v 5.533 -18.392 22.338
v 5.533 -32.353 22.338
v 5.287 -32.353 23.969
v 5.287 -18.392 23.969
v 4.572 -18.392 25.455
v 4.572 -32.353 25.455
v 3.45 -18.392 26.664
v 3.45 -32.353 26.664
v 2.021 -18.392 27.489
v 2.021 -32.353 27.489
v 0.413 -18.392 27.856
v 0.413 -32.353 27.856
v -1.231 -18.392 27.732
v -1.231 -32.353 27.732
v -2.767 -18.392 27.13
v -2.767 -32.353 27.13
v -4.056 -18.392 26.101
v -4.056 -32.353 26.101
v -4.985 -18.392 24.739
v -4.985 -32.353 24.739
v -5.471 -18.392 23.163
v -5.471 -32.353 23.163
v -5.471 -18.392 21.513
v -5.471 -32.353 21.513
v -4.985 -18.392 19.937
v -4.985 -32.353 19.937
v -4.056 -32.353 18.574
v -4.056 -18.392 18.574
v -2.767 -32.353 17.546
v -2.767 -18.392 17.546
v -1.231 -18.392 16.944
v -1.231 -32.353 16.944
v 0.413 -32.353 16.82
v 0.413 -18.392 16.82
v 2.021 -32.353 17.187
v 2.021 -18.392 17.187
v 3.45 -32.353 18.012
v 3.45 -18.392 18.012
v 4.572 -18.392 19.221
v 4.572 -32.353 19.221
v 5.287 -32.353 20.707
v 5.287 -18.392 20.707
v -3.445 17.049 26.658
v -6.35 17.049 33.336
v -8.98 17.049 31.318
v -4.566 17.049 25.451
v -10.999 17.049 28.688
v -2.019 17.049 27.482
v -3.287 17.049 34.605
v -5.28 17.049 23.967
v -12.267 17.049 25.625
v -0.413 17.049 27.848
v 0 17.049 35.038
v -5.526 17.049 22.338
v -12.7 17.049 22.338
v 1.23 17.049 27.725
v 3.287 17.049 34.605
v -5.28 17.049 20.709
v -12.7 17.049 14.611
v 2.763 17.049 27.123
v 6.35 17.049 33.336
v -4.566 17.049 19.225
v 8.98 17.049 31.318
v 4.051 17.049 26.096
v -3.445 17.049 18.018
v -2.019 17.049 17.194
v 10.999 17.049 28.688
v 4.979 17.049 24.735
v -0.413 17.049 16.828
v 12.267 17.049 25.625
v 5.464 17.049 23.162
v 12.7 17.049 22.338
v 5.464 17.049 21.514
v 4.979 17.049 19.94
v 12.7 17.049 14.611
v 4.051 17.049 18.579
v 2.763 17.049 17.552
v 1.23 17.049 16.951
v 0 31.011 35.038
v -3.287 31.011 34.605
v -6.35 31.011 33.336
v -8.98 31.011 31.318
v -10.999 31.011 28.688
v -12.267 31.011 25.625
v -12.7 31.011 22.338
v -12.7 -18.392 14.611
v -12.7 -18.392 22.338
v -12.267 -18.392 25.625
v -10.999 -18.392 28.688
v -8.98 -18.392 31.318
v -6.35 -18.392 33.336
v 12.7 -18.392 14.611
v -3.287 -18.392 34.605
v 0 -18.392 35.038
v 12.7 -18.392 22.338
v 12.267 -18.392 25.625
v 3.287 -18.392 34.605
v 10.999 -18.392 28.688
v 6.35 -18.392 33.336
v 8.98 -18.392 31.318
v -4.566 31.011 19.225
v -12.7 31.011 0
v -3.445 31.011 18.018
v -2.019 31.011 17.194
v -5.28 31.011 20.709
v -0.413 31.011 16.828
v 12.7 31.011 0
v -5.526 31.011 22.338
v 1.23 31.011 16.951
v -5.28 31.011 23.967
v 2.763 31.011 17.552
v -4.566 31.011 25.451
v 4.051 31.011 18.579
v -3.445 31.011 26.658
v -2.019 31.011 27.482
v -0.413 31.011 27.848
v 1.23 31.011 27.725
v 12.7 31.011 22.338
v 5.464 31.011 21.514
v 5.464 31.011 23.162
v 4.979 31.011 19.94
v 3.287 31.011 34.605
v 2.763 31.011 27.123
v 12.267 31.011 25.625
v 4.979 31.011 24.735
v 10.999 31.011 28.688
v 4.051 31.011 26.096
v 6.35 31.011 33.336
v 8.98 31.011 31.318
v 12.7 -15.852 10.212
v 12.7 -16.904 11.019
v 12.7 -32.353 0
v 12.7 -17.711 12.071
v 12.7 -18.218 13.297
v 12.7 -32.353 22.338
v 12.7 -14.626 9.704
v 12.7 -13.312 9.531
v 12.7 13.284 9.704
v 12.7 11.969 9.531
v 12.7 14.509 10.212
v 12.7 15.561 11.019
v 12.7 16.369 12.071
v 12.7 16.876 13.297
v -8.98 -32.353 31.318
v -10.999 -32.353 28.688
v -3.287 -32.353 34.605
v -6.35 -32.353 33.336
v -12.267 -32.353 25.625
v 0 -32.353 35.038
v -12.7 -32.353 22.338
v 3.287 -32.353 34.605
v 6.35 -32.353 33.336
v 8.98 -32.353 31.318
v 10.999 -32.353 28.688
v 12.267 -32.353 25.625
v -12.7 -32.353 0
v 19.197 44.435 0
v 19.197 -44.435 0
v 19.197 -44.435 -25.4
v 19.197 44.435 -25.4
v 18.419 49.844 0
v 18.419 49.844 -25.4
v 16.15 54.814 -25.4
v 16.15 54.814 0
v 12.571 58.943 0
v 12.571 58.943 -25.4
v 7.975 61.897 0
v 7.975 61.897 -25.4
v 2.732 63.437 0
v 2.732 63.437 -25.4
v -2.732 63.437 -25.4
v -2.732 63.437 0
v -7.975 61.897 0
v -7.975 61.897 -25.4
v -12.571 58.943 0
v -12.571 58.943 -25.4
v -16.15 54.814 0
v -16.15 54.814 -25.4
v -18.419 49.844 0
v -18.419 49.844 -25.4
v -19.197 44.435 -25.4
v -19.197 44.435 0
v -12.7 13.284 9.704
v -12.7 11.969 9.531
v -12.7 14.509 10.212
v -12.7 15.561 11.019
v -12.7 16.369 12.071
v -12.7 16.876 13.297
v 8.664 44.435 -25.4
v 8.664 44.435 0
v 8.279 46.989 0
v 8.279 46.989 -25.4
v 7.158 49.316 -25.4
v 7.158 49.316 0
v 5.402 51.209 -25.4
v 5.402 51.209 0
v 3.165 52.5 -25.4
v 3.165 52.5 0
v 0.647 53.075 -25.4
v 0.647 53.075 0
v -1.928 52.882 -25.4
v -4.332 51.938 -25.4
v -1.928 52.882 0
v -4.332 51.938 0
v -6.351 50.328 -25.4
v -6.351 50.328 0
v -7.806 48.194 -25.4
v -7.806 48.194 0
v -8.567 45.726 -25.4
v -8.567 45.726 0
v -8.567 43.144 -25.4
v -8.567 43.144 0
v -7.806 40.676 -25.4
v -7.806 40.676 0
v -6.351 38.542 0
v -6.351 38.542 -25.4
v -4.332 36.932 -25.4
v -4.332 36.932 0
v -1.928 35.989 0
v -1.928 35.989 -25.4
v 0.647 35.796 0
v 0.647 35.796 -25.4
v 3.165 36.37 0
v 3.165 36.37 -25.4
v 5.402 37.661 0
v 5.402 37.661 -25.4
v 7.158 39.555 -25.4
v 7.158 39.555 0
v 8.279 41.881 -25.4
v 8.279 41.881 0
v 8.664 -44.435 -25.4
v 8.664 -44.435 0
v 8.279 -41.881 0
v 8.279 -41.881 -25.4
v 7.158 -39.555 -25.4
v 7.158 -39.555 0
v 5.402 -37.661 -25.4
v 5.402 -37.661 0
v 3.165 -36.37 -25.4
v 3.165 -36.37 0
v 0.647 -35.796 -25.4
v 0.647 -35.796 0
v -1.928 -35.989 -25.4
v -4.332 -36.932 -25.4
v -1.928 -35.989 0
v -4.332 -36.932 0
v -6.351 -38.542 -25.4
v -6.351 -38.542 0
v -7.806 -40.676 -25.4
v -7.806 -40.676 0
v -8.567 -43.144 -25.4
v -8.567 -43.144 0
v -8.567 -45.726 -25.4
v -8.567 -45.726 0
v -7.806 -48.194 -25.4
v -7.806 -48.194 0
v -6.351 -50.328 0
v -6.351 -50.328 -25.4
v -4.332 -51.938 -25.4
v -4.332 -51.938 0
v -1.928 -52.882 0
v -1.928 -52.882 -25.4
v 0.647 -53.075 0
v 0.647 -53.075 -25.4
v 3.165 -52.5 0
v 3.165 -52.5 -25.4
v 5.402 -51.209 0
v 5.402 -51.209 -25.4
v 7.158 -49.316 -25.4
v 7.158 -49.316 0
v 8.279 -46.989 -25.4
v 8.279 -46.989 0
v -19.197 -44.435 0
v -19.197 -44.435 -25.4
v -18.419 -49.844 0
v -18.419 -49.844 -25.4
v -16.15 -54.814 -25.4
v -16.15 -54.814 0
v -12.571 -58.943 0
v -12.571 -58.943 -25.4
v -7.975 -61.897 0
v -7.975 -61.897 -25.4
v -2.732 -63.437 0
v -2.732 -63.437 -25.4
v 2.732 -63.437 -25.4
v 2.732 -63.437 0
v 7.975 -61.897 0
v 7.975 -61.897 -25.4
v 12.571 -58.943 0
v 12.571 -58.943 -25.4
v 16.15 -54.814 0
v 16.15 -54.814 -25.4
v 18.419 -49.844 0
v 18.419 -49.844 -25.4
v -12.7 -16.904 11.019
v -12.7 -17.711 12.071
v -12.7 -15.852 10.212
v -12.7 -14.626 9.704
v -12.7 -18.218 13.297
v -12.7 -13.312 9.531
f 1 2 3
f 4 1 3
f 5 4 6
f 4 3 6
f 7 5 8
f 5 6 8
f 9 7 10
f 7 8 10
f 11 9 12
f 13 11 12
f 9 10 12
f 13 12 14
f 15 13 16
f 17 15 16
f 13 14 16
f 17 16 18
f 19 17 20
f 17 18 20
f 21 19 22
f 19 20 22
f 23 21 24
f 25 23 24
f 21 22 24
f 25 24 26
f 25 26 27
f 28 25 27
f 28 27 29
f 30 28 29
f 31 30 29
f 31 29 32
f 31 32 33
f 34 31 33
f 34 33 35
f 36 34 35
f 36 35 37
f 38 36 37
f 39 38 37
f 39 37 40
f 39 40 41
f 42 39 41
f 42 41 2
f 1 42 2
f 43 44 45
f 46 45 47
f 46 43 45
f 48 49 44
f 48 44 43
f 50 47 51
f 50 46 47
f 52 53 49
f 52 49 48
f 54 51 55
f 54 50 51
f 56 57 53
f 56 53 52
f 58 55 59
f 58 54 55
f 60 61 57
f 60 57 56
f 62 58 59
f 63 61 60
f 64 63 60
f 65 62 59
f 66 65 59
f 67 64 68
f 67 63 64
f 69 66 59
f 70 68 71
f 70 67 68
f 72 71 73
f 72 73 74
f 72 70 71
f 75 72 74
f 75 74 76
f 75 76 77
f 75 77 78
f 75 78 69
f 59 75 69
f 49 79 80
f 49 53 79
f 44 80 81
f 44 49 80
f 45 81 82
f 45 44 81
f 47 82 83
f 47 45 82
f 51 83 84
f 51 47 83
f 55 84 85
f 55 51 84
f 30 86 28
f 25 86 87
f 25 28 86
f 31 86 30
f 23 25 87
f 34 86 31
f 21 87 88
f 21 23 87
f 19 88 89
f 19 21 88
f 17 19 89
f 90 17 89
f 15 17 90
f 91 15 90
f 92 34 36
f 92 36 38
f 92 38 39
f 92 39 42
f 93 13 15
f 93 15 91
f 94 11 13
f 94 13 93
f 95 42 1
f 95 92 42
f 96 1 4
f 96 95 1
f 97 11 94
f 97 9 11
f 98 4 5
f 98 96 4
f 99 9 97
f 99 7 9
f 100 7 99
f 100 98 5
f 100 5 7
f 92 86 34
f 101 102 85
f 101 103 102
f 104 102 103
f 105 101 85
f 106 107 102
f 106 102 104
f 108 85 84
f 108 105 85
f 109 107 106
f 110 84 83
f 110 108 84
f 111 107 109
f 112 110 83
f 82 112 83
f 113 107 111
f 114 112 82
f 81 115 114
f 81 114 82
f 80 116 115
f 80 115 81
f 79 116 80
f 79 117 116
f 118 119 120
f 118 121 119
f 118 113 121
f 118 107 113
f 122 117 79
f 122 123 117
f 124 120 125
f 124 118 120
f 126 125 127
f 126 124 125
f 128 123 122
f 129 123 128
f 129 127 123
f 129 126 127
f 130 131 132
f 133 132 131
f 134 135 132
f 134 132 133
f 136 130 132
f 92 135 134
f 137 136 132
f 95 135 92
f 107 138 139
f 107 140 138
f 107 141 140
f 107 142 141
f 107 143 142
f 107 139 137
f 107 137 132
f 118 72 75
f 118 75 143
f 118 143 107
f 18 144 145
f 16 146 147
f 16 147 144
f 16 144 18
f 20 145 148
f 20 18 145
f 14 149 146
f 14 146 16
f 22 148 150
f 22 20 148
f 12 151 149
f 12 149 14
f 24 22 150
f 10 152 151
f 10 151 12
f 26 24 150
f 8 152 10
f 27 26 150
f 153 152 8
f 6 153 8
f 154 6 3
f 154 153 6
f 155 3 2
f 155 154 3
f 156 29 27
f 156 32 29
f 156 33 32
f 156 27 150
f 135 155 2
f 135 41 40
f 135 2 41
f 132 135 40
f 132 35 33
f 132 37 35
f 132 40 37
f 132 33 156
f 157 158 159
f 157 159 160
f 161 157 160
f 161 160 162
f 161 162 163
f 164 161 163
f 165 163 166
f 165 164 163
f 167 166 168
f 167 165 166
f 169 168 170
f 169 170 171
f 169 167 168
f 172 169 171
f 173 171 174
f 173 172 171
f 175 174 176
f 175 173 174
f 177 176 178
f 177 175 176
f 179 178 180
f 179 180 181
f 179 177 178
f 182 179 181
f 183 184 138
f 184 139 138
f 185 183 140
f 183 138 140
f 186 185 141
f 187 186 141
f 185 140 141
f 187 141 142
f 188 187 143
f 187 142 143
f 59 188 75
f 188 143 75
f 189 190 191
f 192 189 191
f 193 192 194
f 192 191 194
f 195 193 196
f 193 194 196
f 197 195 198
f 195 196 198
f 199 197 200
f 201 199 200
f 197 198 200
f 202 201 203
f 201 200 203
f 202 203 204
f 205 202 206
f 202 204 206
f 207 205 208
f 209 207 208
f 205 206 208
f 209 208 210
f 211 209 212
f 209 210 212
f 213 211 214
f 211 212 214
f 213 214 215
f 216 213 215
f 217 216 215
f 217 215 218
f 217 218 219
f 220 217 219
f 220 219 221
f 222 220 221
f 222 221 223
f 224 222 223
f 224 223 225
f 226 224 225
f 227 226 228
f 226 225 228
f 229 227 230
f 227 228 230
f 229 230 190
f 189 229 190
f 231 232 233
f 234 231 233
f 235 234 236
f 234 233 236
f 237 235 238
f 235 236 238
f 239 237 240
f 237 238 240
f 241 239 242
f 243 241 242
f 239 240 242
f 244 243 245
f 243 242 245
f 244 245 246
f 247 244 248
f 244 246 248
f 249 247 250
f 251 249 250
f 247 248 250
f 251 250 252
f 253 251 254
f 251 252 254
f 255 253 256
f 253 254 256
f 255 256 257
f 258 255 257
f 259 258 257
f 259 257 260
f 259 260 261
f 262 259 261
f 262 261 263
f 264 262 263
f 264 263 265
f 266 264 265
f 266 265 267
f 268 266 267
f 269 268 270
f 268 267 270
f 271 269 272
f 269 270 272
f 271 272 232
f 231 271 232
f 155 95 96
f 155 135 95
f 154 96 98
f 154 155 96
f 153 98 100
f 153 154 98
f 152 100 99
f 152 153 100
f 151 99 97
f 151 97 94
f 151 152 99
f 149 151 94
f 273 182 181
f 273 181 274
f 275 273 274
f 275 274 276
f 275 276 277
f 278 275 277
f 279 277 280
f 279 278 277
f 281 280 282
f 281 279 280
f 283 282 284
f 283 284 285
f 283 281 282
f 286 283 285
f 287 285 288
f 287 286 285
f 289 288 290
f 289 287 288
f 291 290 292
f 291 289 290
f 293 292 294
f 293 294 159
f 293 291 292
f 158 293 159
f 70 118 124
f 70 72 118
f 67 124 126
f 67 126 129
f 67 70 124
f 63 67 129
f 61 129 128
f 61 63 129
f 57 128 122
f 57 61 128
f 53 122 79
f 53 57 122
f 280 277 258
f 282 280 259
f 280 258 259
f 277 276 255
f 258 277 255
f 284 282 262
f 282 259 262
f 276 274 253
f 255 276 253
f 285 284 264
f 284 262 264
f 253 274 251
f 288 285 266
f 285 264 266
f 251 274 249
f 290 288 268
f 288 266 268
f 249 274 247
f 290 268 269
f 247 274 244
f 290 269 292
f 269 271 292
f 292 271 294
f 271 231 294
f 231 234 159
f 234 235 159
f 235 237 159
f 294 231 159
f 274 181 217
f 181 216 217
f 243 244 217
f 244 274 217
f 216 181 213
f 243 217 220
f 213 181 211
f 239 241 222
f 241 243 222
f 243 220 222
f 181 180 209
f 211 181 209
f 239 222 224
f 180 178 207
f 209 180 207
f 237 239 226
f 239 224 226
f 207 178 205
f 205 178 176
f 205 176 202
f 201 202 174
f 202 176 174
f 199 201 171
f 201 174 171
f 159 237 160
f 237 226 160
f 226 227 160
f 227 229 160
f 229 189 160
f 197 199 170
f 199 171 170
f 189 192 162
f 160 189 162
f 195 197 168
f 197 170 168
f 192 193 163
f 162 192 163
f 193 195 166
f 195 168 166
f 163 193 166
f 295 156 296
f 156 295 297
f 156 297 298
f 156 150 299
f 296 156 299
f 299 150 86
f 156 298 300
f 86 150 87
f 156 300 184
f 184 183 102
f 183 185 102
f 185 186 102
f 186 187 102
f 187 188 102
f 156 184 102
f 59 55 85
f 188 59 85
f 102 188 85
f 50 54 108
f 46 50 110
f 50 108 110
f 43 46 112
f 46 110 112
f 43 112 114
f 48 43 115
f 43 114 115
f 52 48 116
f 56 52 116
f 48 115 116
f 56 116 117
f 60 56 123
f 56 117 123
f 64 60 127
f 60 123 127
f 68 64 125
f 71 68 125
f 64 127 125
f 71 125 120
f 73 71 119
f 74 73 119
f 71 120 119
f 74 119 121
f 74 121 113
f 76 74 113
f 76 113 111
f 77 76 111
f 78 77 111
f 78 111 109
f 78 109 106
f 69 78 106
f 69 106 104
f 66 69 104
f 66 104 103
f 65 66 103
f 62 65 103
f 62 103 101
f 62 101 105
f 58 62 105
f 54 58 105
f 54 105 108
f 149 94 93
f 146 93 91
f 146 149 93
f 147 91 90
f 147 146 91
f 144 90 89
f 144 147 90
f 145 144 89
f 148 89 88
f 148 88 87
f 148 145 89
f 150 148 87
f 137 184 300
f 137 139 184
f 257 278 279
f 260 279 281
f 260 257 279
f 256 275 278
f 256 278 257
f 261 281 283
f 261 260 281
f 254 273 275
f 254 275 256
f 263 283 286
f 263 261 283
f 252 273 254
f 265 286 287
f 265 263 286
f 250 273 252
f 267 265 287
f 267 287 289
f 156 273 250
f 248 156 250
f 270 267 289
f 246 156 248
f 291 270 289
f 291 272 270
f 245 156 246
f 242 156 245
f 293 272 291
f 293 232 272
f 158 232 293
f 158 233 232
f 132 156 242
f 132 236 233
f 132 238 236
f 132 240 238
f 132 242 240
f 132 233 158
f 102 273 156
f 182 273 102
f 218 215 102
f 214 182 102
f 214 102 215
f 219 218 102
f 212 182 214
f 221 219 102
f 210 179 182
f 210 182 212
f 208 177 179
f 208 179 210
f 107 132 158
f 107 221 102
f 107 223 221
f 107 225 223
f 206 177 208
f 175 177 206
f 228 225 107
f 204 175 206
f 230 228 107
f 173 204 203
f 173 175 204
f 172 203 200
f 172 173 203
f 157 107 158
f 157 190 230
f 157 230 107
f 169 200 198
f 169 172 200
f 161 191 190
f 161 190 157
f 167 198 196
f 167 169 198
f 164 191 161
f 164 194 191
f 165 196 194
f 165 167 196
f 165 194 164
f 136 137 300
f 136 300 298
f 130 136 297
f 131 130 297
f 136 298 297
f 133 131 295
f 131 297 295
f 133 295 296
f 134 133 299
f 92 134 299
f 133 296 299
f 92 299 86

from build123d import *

# Parameters (mm, degrees)
F0_R      = 8.6637425689
F1_DEPTH  = 25.4
F3_DEPTH  = 12.7
F4_R      = 5.08
F5_R      = 5.08
F6_R      = 12.7
F7_R      = 12.69999
F8_R      = 12.7
F9_R      = 12.69999
F10_R     = 5.5257991494
F11_DEPTH = 25.4
F12_R     = 5.5331253453
F13_DEPTH = 25.4


# Not quite as in the source:
# - a fillet or chamfer is up to 0.001 mm smaller than in the source, because OpenCascade refuses the exact size


with BuildPart() as f1:
    # F0 (on Top) → F1 (new body)
    with BuildSketch(Plane.XY):
        with BuildLine():
            ThreePointArc((19.1970299929, 44.4350838661), (0, 63.6321138591), (-19.1970299929, 44.4350838661))
            Line((-19.1970299929, 44.4350838661), (-19.1970299929, -44.4350838661))
            ThreePointArc((-19.1970299929, -44.4350838661), (0, -63.6321138591), (19.1970299929, -44.4350838661))
            Line((19.1970299929, -44.4350838661), (19.1970299929, 44.4350838661))
        make_face()
        with Locations((0, -44.4350838661)):
            Circle(F0_R, mode=Mode.SUBTRACT)
        with Locations((0, 44.4350838661)):
            Circle(F0_R, mode=Mode.SUBTRACT)
    extrude(amount=-F1_DEPTH)

    # F2 (on Right) → F3 (join, symmetric)
    with BuildSketch(Plane.YZ):
        Polygon((-32.3530361056, 35.0379385054), (-32.3530361056, 0), (31.0105849057, 0), (31.0105849057, 35.0379385054), (17.0491095632, 35.0379385054), (17.0491095632, 9.5313927159), (-18.3915607631, 9.5313927159), (-18.3915607631, 35.0379385054), align=None)
    extrude(amount=F3_DEPTH, both=True)

    # F4
    f4_edges = [f1.edges().sort_by_distance(p)[0] for p in [
        (0, -18.391561, 9.531393),
    ]]
    fillet(f4_edges, radius=F4_R)

    # F5
    f5_edges = [f1.edges().sort_by_distance(p)[0] for p in [
        (0, 17.04911, 9.531393),
    ]]
    fillet(f5_edges, radius=F5_R)

    # F6
    f6_edges = [f1.edges().sort_by_distance(p)[0] for p in [
        (12.7, -25.372298, 35.037939),
    ]]
    fillet(f6_edges, radius=F6_R)

    # F7 (radius 12.7 in the source; OpenCascade refuses exactly that, so slightly less here)
    f7_edges = [f1.edges().sort_by_distance(p)[0] for p in [
        (-12.7, -25.372298, 35.037939),
    ]]
    fillet(f7_edges, radius=F7_R)

    # F8
    f8_edges = [f1.edges().sort_by_distance(p)[0] for p in [
        (12.7, 24.029847, 35.037939),
    ]]
    fillet(f8_edges, radius=F8_R)

    # F9 (radius 12.7 in the source; OpenCascade refuses exactly that, so slightly less here)
    f9_edges = [f1.edges().sort_by_distance(p)[0] for p in [
        (-12.7, 24.029847, 35.037939),
    ]]
    fillet(f9_edges, radius=F9_R)

    # F10 (on face) → F11 (cut)
    with BuildSketch(Plane(origin=(0, 31.0105849057, 0), x_dir=(-1, 0, 0), z_dir=(0, 1, 0))):
        with Locations((0, 22.3379385054)):
            Circle(F10_R)
    extrude(amount=-F11_DEPTH, mode=Mode.SUBTRACT)

    # F12 (on face) → F13 (cut)
    with BuildSketch(Plane.XZ.offset(32.3530361056)):
        with Locations((0, 22.3379385054)):
            Circle(F12_R)
    extrude(amount=-F13_DEPTH, mode=Mode.SUBTRACT)


solid = f1.part
